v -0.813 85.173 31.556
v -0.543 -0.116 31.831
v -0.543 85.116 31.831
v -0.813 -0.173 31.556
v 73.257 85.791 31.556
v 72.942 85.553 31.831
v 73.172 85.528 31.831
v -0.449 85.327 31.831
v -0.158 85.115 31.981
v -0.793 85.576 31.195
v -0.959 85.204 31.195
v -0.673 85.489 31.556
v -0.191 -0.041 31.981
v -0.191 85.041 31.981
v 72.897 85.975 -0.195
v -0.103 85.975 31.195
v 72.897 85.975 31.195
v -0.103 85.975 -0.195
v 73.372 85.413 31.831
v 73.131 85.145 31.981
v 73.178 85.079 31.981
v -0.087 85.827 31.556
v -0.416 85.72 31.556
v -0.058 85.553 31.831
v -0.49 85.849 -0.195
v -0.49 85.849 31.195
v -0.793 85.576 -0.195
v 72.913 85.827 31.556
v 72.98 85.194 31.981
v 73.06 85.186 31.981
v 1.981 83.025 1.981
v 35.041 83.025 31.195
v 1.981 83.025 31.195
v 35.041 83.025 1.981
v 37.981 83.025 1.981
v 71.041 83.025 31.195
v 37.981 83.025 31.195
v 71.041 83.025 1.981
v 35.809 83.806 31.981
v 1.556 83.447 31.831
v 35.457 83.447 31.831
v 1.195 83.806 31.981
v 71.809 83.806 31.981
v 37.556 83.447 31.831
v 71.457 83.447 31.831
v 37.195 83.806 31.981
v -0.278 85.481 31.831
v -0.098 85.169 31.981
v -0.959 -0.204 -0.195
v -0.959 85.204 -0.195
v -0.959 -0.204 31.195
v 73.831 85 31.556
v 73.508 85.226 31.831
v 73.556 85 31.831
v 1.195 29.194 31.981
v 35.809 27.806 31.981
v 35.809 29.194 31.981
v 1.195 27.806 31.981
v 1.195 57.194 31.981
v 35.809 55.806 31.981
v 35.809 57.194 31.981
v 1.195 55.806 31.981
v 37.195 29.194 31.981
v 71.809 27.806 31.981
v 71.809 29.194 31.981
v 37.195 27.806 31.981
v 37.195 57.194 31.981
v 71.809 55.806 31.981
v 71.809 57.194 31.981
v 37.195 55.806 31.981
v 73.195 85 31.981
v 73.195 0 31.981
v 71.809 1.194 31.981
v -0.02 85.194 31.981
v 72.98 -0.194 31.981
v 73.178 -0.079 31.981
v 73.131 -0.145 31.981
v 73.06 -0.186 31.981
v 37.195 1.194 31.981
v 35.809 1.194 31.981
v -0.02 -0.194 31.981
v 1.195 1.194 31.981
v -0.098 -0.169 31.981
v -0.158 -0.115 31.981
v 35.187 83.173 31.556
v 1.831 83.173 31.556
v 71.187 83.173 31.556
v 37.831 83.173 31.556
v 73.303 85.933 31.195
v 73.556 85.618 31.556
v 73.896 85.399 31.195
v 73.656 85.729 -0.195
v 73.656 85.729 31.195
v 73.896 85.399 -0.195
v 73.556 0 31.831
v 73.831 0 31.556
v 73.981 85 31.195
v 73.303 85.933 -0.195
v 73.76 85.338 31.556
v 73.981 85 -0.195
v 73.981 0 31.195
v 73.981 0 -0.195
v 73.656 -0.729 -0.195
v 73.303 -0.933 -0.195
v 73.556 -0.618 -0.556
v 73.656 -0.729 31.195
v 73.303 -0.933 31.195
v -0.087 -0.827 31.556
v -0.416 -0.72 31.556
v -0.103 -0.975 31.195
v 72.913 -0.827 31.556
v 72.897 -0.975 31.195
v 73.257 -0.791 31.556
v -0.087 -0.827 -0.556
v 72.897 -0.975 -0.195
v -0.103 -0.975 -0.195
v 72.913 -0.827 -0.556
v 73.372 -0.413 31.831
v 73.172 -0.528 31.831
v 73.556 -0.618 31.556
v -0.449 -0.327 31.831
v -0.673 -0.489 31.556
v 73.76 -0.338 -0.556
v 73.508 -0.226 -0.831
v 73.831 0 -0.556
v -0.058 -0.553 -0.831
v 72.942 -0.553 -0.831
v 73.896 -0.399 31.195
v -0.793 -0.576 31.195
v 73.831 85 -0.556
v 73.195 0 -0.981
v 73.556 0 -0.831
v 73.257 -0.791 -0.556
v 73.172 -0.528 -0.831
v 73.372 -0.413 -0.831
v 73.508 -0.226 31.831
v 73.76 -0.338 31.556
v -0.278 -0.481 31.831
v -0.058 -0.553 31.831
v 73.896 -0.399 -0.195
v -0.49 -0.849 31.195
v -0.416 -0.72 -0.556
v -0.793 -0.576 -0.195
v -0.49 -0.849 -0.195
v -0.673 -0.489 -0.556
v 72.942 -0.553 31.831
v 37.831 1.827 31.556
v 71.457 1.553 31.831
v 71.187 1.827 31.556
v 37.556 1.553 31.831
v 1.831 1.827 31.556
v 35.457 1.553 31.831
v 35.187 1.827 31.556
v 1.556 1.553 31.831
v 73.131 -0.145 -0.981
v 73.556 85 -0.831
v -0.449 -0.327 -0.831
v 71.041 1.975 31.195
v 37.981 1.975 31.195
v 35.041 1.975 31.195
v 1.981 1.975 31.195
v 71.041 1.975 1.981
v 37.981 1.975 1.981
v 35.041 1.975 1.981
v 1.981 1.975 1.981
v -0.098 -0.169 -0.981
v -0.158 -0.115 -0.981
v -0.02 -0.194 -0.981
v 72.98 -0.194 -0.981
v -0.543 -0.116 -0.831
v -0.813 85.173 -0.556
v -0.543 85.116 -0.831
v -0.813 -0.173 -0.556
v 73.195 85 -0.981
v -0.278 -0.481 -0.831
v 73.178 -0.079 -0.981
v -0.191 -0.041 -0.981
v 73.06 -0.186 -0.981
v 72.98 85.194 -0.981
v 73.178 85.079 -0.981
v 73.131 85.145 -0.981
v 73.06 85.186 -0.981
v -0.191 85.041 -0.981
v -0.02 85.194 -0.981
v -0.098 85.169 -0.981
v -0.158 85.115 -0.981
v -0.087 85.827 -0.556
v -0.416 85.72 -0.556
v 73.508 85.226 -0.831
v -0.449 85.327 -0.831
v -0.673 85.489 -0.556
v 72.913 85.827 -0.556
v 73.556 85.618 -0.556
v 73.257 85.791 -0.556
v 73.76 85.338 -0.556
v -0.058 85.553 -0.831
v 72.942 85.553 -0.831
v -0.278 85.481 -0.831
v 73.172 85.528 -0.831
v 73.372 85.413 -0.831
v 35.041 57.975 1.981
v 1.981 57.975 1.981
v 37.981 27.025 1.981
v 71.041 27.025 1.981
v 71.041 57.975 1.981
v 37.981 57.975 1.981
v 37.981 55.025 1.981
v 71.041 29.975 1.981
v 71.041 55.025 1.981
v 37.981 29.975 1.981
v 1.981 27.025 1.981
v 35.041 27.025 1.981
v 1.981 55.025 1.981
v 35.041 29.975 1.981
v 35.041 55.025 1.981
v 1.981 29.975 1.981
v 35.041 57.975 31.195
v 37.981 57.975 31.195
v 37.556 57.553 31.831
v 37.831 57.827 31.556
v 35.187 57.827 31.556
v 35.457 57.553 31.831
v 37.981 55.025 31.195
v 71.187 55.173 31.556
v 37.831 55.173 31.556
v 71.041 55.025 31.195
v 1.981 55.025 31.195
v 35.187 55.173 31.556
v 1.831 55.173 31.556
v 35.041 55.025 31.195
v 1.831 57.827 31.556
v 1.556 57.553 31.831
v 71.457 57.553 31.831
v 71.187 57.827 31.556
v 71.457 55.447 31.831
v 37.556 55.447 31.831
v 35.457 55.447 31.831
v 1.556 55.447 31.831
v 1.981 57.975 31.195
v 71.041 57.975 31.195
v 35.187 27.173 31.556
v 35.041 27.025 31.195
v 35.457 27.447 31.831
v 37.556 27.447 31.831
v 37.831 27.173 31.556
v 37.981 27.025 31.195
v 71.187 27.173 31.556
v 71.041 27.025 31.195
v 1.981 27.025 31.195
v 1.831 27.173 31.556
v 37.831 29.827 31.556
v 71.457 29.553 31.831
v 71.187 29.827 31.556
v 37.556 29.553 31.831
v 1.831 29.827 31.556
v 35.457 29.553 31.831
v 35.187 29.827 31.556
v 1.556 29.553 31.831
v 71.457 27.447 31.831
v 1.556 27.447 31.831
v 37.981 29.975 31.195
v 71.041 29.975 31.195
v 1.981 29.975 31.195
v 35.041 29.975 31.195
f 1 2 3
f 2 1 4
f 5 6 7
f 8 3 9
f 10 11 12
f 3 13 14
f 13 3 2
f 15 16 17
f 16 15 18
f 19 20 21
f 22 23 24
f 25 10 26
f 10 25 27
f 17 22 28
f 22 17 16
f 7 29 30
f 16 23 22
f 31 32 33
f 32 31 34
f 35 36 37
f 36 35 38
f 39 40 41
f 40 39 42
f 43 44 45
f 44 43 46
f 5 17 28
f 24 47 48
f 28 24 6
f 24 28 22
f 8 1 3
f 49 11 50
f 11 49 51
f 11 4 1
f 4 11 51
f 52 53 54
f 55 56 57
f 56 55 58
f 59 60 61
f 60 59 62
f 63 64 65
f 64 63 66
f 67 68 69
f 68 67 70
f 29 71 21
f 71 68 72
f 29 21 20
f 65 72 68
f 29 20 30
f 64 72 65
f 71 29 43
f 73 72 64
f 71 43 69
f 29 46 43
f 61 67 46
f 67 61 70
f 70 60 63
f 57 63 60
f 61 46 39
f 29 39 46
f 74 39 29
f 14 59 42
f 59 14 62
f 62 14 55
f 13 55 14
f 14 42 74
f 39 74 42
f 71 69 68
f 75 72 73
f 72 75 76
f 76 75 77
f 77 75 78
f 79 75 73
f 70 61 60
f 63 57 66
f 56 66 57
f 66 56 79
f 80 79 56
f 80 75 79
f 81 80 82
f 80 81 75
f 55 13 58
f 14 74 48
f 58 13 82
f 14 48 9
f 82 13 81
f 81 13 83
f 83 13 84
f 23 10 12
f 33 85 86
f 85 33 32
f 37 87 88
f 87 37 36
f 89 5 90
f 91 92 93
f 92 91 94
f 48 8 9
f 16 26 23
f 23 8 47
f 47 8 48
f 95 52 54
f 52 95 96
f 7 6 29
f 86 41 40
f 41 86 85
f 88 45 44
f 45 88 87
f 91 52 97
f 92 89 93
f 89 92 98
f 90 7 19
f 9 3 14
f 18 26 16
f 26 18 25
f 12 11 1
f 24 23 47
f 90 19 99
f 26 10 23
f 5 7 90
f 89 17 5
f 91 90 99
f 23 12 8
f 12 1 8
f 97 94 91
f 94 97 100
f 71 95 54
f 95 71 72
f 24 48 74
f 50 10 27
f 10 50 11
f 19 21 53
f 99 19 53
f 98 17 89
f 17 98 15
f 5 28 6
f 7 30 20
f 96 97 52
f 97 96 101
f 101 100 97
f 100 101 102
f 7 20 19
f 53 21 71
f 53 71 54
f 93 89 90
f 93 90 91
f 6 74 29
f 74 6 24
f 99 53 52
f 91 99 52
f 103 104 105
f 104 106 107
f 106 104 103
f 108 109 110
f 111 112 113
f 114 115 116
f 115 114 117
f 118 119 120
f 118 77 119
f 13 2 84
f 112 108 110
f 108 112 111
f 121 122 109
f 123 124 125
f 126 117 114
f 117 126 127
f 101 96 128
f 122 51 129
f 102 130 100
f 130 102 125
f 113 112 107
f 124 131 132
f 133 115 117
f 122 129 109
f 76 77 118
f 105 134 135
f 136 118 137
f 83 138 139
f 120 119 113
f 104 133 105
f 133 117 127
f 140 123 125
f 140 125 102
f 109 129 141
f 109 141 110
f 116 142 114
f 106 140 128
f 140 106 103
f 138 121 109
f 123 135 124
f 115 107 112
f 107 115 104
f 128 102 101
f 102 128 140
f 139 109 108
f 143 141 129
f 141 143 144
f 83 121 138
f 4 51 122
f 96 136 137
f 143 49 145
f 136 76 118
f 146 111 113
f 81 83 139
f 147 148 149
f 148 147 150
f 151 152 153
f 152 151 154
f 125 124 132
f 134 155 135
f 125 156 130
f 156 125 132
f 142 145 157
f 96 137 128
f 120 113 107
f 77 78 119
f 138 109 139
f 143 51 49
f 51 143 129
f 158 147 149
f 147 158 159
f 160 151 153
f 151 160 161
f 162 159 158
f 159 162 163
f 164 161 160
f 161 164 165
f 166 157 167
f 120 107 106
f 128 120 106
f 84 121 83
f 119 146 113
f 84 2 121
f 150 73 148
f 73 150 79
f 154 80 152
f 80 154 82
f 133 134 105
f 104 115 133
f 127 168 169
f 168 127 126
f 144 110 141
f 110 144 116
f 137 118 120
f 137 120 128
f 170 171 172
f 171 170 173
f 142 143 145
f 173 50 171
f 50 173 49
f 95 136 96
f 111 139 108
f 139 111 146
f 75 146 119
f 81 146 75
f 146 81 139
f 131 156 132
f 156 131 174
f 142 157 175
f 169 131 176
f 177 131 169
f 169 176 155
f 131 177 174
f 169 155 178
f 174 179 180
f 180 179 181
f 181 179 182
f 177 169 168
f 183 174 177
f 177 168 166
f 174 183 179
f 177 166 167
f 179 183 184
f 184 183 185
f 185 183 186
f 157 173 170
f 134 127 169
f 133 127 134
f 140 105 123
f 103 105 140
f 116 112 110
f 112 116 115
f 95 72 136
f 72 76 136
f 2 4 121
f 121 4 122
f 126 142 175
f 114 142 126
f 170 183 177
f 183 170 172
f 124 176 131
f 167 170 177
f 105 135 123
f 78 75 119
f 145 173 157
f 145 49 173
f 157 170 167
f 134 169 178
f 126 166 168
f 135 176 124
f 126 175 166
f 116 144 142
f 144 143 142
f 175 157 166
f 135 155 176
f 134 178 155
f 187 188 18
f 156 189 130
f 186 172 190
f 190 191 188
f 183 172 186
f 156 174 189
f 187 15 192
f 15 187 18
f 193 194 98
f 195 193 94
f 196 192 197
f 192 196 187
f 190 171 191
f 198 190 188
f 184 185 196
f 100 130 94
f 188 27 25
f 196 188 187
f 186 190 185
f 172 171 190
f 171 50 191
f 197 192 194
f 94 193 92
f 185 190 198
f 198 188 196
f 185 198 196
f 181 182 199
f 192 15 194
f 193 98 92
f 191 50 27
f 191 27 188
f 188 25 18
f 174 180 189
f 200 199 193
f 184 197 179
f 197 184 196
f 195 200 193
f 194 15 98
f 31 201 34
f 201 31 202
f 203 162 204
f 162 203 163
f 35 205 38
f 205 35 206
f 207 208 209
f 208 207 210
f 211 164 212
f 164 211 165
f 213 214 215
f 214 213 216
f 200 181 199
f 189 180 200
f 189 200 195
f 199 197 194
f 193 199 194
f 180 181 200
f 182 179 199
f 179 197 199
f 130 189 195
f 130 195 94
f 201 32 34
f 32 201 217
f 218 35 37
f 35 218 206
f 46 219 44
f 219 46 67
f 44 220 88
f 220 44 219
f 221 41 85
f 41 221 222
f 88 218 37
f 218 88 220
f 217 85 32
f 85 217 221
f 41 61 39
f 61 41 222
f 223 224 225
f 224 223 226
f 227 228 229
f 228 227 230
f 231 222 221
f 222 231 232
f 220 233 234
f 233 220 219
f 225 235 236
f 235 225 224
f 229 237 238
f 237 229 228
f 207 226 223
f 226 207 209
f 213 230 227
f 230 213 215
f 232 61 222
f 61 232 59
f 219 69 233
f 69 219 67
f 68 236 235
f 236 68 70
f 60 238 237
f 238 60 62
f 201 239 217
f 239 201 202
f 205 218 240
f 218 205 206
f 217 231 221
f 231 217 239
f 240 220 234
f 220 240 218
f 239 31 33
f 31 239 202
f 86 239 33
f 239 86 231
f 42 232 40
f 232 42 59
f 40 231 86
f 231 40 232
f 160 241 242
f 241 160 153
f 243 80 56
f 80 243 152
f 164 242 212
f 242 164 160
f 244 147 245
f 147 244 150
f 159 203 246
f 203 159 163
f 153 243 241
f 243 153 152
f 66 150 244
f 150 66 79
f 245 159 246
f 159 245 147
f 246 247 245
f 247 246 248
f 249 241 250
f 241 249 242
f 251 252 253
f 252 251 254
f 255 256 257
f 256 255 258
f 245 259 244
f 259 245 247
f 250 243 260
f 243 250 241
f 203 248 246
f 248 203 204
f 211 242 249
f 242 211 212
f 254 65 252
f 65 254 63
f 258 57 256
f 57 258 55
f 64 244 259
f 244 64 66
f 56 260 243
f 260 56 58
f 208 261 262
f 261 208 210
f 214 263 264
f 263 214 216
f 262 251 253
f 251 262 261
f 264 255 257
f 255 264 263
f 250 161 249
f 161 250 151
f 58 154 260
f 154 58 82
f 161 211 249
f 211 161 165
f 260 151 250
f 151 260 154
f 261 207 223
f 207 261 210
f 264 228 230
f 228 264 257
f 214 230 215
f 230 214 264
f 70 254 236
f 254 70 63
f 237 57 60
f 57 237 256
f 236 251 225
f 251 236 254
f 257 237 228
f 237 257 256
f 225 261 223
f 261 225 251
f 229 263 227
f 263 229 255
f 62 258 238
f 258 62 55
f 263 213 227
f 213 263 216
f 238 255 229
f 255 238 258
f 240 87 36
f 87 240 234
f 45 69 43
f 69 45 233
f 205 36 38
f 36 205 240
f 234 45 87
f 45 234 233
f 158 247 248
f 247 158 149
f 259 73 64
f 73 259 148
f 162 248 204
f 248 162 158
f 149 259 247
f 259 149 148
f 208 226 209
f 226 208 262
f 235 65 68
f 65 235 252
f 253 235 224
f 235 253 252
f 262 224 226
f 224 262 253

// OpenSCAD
wall = 1;  // thickness of wall

// 3s 500 zippy

// 3s 1300 graphene

module zippy_3s_500() {
bxx = 33;  // battery width
byy = 19;  // battery depth
bzz = 20;  // battery height
nyy = 4;  // number of rows
nxx = 3;  // number of columns
}

module graphene_3s_1300() {
bxx = 37;  // battery width
byy = 29;  // battery depth
bzz = 30;  // battery height
nyy = 3;  // number of rows
nxx = 2;  // number of columns
}


iota = .1;

module box() {
}

bxx = 35;  // battery width
byy = 27;  // battery depth
bzz = 30;  // battery height
nyy = 3;  // number of rows
nxx = 2;  // number of columns

module holes() {
    for (i = [0:1:nxx-1]) {
        for (j = [0:1:nyy-1]) {
            translate([wall+(i*(bxx+wall)), wall+(j*(byy+wall)),wall]) {
                color("blue") cube([bxx,byy,bzz+iota]);
            }
        }
    }
}

//difference() {
//    cube([nxx*(bxx+wall)+wall,nyy*(byy+wall)+wall,bzz+wall]);
//    holes();
//}

$fn=15;
minkowski() {
      difference() {
          cube([nxx*(bxx+wall)+wall,nyy*(byy+wall)+wall,bzz+wall]);
          holes();
      }
      sphere(r=wall);
}
